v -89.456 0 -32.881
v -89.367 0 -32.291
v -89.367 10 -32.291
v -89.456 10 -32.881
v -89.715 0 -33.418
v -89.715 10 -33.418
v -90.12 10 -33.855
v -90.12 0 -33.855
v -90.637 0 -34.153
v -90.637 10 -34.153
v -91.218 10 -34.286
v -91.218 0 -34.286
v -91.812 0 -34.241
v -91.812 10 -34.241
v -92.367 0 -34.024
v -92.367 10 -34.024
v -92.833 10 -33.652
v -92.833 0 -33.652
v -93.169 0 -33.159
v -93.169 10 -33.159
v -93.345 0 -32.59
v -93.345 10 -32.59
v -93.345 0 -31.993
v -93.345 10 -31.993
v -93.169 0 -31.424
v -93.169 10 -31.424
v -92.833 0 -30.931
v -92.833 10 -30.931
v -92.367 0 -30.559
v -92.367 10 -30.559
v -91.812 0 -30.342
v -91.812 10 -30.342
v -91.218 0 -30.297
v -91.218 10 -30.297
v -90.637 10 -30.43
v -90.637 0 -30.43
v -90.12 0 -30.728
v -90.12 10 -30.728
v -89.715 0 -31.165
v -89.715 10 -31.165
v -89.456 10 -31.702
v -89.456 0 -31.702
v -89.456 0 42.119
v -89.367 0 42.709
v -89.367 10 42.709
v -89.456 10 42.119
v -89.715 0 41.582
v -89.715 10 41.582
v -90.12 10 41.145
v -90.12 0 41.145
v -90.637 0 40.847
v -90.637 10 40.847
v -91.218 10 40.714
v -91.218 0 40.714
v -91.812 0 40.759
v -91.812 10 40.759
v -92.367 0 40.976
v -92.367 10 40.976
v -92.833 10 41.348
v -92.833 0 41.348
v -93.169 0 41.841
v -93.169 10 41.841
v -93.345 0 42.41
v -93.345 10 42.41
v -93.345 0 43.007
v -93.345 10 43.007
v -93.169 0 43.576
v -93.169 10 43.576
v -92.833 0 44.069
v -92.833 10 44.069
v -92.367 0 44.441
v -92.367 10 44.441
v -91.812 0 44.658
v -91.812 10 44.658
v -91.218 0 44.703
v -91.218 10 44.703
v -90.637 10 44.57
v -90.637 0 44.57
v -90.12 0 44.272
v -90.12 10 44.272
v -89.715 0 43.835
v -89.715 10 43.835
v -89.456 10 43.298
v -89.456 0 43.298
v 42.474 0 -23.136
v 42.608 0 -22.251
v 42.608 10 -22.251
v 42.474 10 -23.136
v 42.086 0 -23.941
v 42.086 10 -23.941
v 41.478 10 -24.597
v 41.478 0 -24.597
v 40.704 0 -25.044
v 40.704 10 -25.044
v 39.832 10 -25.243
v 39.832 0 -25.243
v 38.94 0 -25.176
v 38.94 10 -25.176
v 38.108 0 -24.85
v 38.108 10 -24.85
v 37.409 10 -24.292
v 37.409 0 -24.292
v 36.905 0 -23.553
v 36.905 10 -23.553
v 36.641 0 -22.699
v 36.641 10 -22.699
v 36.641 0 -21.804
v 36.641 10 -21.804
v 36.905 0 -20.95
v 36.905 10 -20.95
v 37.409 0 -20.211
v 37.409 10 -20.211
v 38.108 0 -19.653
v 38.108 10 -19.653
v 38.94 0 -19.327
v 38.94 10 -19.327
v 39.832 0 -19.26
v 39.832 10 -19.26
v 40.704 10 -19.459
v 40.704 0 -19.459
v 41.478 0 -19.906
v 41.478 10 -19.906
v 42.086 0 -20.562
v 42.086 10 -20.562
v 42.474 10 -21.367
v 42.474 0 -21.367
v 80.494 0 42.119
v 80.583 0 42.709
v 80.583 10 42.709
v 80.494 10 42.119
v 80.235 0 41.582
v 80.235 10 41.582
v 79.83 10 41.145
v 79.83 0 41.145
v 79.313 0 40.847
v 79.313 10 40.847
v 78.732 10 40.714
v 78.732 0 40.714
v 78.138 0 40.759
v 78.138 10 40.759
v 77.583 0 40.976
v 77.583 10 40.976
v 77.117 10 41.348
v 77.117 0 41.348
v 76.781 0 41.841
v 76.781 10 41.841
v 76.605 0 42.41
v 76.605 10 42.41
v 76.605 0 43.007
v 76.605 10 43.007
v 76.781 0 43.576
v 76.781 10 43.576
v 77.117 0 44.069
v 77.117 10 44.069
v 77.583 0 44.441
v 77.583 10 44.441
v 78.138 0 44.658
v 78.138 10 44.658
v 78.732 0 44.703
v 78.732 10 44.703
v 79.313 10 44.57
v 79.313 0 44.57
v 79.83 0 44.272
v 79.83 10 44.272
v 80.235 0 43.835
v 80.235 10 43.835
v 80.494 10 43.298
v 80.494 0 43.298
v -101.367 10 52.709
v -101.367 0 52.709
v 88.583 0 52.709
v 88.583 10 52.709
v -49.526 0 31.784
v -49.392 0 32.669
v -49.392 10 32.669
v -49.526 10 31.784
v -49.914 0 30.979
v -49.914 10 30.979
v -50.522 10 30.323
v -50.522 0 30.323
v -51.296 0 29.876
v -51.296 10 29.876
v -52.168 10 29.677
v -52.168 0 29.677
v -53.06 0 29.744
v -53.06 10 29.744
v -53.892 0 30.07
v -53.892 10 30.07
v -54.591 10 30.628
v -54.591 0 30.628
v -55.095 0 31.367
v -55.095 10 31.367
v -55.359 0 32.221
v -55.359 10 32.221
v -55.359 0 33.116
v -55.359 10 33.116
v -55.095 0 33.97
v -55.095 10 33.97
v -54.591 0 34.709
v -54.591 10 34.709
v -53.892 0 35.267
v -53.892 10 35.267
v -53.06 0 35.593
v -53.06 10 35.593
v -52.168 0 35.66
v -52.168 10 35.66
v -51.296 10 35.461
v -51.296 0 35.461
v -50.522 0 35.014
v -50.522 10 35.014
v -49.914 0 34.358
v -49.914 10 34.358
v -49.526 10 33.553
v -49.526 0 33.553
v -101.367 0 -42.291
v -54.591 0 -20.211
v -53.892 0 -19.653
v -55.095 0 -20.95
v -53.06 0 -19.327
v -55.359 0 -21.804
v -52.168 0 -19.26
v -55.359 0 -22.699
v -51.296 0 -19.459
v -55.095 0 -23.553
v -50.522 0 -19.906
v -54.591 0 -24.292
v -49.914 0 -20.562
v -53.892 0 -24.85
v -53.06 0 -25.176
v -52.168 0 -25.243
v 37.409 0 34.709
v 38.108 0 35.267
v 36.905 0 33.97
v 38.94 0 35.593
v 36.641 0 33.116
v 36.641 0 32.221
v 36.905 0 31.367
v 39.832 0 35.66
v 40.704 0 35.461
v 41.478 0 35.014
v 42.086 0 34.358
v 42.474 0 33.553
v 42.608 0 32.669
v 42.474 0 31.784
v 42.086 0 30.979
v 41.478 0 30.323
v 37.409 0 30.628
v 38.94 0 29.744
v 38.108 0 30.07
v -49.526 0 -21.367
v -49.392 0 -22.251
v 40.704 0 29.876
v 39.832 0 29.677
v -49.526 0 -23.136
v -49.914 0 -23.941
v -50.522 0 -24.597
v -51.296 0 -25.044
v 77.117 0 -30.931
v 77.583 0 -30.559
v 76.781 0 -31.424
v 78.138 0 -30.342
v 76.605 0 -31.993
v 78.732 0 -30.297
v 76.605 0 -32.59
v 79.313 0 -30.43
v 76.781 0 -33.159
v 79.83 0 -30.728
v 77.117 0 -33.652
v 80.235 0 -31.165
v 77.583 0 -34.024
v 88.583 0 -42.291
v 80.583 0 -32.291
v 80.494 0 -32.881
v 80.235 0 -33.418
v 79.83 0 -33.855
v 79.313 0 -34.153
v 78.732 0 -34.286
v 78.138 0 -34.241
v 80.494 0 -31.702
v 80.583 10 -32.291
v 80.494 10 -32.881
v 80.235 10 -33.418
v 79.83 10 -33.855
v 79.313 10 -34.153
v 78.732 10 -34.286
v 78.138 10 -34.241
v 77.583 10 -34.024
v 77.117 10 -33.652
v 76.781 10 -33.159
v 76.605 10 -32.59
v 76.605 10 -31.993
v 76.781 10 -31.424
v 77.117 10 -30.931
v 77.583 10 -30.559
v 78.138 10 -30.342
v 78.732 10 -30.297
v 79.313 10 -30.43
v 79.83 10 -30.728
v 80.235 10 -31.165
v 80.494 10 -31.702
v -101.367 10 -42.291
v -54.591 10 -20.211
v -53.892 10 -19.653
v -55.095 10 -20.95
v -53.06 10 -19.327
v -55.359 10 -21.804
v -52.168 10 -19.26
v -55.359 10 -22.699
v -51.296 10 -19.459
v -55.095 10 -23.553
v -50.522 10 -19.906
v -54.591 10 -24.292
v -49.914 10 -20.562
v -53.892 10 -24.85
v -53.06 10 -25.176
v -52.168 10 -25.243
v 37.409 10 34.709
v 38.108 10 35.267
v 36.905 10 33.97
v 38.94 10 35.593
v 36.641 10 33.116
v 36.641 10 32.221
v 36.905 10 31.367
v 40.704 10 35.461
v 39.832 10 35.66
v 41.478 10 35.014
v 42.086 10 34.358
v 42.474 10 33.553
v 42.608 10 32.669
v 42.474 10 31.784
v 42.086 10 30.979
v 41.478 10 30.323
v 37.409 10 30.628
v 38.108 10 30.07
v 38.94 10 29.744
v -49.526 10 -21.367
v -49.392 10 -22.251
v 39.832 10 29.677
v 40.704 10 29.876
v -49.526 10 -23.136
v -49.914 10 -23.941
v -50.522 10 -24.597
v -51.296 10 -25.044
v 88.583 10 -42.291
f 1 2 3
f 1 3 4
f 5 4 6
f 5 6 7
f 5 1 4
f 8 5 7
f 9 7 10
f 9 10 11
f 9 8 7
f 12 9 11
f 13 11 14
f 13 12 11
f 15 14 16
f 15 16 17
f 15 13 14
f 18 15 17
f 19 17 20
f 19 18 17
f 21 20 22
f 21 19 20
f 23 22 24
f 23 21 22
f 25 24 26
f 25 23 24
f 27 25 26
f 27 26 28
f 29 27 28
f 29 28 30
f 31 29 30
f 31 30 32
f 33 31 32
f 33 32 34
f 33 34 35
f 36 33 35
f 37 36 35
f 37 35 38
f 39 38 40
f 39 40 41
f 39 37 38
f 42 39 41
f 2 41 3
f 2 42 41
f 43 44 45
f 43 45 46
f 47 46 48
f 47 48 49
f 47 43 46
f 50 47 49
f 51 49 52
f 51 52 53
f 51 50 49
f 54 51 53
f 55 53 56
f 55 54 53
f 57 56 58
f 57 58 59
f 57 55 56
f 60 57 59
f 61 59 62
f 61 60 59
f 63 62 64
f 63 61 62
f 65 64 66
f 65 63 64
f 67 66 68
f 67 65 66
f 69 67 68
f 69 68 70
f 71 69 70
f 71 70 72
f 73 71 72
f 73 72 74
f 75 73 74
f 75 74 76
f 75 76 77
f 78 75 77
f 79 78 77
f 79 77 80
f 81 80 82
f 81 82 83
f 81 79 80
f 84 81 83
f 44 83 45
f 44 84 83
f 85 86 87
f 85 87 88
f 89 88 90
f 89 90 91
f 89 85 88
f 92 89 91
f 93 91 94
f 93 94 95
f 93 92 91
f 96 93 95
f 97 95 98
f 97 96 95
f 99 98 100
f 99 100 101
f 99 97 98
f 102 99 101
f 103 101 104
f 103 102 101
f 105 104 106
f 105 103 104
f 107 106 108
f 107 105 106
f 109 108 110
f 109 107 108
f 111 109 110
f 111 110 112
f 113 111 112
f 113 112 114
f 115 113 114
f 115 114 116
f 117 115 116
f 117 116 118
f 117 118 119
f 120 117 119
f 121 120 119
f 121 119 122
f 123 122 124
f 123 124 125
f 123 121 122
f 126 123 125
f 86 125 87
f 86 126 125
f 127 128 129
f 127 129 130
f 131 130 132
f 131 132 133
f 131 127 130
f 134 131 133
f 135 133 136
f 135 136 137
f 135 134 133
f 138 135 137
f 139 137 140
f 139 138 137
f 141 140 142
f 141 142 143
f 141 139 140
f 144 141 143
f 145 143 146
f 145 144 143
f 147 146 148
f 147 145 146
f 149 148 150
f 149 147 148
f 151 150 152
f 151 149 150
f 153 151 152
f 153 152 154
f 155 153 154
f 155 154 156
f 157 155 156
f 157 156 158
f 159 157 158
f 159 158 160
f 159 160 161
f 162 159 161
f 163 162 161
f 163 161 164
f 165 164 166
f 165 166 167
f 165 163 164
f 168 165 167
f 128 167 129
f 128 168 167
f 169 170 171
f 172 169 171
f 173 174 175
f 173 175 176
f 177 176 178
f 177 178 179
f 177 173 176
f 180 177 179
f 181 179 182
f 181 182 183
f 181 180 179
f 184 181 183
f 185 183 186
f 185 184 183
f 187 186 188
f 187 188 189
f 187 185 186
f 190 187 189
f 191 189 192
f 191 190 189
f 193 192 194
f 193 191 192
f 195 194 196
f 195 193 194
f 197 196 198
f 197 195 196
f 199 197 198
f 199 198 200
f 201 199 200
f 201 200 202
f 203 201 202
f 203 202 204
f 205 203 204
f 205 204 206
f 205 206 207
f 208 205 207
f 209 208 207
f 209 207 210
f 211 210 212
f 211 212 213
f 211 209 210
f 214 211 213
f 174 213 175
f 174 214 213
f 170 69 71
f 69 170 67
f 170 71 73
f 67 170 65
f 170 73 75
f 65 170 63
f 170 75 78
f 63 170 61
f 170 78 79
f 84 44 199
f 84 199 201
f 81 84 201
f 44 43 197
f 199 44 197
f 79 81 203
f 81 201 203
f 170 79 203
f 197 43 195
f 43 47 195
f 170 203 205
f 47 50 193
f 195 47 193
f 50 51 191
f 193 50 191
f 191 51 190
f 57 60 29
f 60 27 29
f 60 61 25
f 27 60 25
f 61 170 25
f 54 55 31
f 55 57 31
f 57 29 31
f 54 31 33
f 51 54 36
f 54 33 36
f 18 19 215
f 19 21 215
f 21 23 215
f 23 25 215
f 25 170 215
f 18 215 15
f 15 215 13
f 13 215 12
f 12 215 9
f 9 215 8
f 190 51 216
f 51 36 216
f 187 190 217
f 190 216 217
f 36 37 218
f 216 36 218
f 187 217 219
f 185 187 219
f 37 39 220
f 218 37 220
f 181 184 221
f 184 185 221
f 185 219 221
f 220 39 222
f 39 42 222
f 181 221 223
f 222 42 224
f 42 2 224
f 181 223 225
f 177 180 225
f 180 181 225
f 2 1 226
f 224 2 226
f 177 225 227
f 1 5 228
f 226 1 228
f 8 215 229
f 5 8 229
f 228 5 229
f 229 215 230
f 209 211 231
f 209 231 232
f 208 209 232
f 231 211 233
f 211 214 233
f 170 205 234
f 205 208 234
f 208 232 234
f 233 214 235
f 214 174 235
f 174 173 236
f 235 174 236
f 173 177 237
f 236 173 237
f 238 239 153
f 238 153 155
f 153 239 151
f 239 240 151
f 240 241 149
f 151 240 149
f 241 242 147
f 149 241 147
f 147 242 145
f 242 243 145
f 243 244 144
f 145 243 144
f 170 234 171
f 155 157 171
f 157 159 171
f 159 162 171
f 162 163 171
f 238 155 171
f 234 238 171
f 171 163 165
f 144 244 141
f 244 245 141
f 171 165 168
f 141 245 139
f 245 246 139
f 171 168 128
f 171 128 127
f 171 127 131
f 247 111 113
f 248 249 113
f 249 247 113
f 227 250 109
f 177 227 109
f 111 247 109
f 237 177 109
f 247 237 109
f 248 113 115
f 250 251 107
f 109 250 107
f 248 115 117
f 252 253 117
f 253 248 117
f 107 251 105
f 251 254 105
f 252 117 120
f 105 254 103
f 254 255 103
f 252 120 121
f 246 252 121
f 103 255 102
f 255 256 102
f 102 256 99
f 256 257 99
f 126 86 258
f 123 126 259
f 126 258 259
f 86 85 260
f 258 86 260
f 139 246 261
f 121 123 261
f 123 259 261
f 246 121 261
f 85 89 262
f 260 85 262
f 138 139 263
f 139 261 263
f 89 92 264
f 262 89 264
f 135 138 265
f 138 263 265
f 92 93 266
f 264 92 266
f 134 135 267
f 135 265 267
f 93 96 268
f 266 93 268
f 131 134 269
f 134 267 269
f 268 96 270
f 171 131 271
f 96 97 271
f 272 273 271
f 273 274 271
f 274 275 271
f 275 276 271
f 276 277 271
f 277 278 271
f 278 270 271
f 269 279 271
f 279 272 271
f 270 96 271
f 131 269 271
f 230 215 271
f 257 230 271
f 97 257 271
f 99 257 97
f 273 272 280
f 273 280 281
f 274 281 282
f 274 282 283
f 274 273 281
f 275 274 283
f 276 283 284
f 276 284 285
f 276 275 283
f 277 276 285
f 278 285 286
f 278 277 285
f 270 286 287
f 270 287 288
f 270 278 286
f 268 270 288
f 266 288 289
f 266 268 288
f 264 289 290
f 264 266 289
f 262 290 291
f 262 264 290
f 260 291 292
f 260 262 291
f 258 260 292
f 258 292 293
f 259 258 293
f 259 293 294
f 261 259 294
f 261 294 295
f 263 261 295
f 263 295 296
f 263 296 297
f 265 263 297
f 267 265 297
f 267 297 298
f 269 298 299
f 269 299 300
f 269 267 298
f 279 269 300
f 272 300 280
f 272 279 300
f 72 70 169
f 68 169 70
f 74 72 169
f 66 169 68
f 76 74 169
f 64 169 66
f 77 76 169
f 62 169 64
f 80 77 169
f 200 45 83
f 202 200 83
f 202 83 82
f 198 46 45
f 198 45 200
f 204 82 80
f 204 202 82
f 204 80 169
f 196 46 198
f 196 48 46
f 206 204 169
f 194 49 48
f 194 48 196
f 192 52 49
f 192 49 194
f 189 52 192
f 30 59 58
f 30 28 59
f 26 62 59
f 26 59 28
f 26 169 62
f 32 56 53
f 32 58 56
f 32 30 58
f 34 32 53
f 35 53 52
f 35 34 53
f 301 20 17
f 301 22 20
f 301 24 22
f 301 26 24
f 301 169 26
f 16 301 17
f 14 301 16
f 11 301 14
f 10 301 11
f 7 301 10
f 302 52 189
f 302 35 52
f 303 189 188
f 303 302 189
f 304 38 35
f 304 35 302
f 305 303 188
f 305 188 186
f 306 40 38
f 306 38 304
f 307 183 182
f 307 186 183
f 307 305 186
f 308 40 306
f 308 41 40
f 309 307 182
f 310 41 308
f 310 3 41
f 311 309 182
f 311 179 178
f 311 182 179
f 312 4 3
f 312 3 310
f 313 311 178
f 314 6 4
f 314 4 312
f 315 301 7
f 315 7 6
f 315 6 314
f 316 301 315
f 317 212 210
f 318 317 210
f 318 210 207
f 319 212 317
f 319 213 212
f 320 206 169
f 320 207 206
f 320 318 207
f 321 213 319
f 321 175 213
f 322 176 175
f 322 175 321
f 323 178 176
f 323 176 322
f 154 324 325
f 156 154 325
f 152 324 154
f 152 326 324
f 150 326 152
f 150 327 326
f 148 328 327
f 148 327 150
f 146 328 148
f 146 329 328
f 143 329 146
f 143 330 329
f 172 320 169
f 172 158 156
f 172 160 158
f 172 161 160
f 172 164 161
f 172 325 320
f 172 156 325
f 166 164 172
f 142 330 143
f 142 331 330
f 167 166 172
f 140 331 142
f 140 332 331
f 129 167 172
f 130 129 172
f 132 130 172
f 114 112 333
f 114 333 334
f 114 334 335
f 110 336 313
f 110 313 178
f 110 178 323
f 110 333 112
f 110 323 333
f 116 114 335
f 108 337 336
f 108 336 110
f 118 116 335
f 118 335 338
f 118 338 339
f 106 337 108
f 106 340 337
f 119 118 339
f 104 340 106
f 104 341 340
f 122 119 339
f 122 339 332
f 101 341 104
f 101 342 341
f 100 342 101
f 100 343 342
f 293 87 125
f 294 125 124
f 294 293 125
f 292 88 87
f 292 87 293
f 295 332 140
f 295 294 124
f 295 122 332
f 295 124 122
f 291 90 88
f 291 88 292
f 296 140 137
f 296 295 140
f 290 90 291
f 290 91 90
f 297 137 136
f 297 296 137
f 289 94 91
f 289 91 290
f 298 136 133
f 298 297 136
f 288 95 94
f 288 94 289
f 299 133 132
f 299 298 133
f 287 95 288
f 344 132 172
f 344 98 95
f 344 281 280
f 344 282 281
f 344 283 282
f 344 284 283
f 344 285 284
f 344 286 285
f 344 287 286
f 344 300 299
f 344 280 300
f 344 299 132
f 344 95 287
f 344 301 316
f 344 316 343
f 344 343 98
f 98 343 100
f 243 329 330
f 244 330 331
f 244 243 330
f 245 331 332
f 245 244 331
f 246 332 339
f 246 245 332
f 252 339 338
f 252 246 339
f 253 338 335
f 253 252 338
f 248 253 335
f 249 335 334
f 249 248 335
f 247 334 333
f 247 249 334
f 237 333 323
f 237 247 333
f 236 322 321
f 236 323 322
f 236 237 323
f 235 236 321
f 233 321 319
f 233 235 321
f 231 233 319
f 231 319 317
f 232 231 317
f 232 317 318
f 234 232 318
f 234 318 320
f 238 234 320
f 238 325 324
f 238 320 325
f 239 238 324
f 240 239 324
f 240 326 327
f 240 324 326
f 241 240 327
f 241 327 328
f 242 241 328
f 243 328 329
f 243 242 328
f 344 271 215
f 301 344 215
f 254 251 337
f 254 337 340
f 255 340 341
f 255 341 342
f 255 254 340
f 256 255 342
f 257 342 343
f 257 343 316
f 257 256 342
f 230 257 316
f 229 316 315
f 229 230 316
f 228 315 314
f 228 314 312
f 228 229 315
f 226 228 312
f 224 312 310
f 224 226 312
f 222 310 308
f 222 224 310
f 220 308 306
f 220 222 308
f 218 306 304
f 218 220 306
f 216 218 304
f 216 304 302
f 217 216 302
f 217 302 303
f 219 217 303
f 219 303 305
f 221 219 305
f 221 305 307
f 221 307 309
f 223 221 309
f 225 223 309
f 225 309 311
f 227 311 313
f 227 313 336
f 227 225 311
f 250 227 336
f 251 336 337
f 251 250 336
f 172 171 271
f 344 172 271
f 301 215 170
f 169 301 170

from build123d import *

# Parameters (mm, degrees)
SKETCH2_R           = 2
SKETCH2_R_2         = 3
BOSS_EXTRUDE1_DEPTH = 10
SKETCH2_4_R         = 3
CUT_EXTRUDE1_DEPTH  = 35


with BuildPart() as part:
    # Sketch2 → Boss-Extrude1 (new body)
    with BuildSketch(Plane(origin=(0, 0, 0), x_dir=(1, 0, 0), z_dir=(0, 1, 0))):
        Polygon((-91.36726229, 42.291495859), (-101.36726229, 42.291495859), (-101.36726229, -52.708504141), (88.58273771, -52.708504141), (88.58273771, 42.291495859), align=None)
        with Locations((-91.36726229, -42.708504141)):
            Circle(SKETCH2_R, mode=Mode.SUBTRACT)
        with Locations((-52.39226229, -32.668504141)):
            Circle(SKETCH2_R_2, mode=Mode.SUBTRACT)
        with Locations((-52.39226229, 22.251495859)):
            Circle(SKETCH2_R_2, mode=Mode.SUBTRACT)
        with Locations((-91.36726229, 32.291495859)):
            Circle(SKETCH2_R, mode=Mode.SUBTRACT)
        with Locations((39.60773771, 22.251495859)):
            Circle(SKETCH2_R_2, mode=Mode.SUBTRACT)
        with Locations((78.58273771, 32.291495859)):
            Circle(SKETCH2_R, mode=Mode.SUBTRACT)
        with Locations((78.58273771, -42.708504141)):
            Circle(SKETCH2_R, mode=Mode.SUBTRACT)
    extrude(amount=BOSS_EXTRUDE1_DEPTH)

    # Sketch2<4> → Cut-Extrude1 (cut)
    with BuildSketch(Plane(origin=(0, 0, 0), x_dir=(1, 0, 0), z_dir=(0, 1, 0))):
        with Locations((39.60773771, -32.668504141)):
            Circle(SKETCH2_4_R)
    extrude(amount=CUT_EXTRUDE1_DEPTH, mode=Mode.SUBTRACT)


solid = part.part
